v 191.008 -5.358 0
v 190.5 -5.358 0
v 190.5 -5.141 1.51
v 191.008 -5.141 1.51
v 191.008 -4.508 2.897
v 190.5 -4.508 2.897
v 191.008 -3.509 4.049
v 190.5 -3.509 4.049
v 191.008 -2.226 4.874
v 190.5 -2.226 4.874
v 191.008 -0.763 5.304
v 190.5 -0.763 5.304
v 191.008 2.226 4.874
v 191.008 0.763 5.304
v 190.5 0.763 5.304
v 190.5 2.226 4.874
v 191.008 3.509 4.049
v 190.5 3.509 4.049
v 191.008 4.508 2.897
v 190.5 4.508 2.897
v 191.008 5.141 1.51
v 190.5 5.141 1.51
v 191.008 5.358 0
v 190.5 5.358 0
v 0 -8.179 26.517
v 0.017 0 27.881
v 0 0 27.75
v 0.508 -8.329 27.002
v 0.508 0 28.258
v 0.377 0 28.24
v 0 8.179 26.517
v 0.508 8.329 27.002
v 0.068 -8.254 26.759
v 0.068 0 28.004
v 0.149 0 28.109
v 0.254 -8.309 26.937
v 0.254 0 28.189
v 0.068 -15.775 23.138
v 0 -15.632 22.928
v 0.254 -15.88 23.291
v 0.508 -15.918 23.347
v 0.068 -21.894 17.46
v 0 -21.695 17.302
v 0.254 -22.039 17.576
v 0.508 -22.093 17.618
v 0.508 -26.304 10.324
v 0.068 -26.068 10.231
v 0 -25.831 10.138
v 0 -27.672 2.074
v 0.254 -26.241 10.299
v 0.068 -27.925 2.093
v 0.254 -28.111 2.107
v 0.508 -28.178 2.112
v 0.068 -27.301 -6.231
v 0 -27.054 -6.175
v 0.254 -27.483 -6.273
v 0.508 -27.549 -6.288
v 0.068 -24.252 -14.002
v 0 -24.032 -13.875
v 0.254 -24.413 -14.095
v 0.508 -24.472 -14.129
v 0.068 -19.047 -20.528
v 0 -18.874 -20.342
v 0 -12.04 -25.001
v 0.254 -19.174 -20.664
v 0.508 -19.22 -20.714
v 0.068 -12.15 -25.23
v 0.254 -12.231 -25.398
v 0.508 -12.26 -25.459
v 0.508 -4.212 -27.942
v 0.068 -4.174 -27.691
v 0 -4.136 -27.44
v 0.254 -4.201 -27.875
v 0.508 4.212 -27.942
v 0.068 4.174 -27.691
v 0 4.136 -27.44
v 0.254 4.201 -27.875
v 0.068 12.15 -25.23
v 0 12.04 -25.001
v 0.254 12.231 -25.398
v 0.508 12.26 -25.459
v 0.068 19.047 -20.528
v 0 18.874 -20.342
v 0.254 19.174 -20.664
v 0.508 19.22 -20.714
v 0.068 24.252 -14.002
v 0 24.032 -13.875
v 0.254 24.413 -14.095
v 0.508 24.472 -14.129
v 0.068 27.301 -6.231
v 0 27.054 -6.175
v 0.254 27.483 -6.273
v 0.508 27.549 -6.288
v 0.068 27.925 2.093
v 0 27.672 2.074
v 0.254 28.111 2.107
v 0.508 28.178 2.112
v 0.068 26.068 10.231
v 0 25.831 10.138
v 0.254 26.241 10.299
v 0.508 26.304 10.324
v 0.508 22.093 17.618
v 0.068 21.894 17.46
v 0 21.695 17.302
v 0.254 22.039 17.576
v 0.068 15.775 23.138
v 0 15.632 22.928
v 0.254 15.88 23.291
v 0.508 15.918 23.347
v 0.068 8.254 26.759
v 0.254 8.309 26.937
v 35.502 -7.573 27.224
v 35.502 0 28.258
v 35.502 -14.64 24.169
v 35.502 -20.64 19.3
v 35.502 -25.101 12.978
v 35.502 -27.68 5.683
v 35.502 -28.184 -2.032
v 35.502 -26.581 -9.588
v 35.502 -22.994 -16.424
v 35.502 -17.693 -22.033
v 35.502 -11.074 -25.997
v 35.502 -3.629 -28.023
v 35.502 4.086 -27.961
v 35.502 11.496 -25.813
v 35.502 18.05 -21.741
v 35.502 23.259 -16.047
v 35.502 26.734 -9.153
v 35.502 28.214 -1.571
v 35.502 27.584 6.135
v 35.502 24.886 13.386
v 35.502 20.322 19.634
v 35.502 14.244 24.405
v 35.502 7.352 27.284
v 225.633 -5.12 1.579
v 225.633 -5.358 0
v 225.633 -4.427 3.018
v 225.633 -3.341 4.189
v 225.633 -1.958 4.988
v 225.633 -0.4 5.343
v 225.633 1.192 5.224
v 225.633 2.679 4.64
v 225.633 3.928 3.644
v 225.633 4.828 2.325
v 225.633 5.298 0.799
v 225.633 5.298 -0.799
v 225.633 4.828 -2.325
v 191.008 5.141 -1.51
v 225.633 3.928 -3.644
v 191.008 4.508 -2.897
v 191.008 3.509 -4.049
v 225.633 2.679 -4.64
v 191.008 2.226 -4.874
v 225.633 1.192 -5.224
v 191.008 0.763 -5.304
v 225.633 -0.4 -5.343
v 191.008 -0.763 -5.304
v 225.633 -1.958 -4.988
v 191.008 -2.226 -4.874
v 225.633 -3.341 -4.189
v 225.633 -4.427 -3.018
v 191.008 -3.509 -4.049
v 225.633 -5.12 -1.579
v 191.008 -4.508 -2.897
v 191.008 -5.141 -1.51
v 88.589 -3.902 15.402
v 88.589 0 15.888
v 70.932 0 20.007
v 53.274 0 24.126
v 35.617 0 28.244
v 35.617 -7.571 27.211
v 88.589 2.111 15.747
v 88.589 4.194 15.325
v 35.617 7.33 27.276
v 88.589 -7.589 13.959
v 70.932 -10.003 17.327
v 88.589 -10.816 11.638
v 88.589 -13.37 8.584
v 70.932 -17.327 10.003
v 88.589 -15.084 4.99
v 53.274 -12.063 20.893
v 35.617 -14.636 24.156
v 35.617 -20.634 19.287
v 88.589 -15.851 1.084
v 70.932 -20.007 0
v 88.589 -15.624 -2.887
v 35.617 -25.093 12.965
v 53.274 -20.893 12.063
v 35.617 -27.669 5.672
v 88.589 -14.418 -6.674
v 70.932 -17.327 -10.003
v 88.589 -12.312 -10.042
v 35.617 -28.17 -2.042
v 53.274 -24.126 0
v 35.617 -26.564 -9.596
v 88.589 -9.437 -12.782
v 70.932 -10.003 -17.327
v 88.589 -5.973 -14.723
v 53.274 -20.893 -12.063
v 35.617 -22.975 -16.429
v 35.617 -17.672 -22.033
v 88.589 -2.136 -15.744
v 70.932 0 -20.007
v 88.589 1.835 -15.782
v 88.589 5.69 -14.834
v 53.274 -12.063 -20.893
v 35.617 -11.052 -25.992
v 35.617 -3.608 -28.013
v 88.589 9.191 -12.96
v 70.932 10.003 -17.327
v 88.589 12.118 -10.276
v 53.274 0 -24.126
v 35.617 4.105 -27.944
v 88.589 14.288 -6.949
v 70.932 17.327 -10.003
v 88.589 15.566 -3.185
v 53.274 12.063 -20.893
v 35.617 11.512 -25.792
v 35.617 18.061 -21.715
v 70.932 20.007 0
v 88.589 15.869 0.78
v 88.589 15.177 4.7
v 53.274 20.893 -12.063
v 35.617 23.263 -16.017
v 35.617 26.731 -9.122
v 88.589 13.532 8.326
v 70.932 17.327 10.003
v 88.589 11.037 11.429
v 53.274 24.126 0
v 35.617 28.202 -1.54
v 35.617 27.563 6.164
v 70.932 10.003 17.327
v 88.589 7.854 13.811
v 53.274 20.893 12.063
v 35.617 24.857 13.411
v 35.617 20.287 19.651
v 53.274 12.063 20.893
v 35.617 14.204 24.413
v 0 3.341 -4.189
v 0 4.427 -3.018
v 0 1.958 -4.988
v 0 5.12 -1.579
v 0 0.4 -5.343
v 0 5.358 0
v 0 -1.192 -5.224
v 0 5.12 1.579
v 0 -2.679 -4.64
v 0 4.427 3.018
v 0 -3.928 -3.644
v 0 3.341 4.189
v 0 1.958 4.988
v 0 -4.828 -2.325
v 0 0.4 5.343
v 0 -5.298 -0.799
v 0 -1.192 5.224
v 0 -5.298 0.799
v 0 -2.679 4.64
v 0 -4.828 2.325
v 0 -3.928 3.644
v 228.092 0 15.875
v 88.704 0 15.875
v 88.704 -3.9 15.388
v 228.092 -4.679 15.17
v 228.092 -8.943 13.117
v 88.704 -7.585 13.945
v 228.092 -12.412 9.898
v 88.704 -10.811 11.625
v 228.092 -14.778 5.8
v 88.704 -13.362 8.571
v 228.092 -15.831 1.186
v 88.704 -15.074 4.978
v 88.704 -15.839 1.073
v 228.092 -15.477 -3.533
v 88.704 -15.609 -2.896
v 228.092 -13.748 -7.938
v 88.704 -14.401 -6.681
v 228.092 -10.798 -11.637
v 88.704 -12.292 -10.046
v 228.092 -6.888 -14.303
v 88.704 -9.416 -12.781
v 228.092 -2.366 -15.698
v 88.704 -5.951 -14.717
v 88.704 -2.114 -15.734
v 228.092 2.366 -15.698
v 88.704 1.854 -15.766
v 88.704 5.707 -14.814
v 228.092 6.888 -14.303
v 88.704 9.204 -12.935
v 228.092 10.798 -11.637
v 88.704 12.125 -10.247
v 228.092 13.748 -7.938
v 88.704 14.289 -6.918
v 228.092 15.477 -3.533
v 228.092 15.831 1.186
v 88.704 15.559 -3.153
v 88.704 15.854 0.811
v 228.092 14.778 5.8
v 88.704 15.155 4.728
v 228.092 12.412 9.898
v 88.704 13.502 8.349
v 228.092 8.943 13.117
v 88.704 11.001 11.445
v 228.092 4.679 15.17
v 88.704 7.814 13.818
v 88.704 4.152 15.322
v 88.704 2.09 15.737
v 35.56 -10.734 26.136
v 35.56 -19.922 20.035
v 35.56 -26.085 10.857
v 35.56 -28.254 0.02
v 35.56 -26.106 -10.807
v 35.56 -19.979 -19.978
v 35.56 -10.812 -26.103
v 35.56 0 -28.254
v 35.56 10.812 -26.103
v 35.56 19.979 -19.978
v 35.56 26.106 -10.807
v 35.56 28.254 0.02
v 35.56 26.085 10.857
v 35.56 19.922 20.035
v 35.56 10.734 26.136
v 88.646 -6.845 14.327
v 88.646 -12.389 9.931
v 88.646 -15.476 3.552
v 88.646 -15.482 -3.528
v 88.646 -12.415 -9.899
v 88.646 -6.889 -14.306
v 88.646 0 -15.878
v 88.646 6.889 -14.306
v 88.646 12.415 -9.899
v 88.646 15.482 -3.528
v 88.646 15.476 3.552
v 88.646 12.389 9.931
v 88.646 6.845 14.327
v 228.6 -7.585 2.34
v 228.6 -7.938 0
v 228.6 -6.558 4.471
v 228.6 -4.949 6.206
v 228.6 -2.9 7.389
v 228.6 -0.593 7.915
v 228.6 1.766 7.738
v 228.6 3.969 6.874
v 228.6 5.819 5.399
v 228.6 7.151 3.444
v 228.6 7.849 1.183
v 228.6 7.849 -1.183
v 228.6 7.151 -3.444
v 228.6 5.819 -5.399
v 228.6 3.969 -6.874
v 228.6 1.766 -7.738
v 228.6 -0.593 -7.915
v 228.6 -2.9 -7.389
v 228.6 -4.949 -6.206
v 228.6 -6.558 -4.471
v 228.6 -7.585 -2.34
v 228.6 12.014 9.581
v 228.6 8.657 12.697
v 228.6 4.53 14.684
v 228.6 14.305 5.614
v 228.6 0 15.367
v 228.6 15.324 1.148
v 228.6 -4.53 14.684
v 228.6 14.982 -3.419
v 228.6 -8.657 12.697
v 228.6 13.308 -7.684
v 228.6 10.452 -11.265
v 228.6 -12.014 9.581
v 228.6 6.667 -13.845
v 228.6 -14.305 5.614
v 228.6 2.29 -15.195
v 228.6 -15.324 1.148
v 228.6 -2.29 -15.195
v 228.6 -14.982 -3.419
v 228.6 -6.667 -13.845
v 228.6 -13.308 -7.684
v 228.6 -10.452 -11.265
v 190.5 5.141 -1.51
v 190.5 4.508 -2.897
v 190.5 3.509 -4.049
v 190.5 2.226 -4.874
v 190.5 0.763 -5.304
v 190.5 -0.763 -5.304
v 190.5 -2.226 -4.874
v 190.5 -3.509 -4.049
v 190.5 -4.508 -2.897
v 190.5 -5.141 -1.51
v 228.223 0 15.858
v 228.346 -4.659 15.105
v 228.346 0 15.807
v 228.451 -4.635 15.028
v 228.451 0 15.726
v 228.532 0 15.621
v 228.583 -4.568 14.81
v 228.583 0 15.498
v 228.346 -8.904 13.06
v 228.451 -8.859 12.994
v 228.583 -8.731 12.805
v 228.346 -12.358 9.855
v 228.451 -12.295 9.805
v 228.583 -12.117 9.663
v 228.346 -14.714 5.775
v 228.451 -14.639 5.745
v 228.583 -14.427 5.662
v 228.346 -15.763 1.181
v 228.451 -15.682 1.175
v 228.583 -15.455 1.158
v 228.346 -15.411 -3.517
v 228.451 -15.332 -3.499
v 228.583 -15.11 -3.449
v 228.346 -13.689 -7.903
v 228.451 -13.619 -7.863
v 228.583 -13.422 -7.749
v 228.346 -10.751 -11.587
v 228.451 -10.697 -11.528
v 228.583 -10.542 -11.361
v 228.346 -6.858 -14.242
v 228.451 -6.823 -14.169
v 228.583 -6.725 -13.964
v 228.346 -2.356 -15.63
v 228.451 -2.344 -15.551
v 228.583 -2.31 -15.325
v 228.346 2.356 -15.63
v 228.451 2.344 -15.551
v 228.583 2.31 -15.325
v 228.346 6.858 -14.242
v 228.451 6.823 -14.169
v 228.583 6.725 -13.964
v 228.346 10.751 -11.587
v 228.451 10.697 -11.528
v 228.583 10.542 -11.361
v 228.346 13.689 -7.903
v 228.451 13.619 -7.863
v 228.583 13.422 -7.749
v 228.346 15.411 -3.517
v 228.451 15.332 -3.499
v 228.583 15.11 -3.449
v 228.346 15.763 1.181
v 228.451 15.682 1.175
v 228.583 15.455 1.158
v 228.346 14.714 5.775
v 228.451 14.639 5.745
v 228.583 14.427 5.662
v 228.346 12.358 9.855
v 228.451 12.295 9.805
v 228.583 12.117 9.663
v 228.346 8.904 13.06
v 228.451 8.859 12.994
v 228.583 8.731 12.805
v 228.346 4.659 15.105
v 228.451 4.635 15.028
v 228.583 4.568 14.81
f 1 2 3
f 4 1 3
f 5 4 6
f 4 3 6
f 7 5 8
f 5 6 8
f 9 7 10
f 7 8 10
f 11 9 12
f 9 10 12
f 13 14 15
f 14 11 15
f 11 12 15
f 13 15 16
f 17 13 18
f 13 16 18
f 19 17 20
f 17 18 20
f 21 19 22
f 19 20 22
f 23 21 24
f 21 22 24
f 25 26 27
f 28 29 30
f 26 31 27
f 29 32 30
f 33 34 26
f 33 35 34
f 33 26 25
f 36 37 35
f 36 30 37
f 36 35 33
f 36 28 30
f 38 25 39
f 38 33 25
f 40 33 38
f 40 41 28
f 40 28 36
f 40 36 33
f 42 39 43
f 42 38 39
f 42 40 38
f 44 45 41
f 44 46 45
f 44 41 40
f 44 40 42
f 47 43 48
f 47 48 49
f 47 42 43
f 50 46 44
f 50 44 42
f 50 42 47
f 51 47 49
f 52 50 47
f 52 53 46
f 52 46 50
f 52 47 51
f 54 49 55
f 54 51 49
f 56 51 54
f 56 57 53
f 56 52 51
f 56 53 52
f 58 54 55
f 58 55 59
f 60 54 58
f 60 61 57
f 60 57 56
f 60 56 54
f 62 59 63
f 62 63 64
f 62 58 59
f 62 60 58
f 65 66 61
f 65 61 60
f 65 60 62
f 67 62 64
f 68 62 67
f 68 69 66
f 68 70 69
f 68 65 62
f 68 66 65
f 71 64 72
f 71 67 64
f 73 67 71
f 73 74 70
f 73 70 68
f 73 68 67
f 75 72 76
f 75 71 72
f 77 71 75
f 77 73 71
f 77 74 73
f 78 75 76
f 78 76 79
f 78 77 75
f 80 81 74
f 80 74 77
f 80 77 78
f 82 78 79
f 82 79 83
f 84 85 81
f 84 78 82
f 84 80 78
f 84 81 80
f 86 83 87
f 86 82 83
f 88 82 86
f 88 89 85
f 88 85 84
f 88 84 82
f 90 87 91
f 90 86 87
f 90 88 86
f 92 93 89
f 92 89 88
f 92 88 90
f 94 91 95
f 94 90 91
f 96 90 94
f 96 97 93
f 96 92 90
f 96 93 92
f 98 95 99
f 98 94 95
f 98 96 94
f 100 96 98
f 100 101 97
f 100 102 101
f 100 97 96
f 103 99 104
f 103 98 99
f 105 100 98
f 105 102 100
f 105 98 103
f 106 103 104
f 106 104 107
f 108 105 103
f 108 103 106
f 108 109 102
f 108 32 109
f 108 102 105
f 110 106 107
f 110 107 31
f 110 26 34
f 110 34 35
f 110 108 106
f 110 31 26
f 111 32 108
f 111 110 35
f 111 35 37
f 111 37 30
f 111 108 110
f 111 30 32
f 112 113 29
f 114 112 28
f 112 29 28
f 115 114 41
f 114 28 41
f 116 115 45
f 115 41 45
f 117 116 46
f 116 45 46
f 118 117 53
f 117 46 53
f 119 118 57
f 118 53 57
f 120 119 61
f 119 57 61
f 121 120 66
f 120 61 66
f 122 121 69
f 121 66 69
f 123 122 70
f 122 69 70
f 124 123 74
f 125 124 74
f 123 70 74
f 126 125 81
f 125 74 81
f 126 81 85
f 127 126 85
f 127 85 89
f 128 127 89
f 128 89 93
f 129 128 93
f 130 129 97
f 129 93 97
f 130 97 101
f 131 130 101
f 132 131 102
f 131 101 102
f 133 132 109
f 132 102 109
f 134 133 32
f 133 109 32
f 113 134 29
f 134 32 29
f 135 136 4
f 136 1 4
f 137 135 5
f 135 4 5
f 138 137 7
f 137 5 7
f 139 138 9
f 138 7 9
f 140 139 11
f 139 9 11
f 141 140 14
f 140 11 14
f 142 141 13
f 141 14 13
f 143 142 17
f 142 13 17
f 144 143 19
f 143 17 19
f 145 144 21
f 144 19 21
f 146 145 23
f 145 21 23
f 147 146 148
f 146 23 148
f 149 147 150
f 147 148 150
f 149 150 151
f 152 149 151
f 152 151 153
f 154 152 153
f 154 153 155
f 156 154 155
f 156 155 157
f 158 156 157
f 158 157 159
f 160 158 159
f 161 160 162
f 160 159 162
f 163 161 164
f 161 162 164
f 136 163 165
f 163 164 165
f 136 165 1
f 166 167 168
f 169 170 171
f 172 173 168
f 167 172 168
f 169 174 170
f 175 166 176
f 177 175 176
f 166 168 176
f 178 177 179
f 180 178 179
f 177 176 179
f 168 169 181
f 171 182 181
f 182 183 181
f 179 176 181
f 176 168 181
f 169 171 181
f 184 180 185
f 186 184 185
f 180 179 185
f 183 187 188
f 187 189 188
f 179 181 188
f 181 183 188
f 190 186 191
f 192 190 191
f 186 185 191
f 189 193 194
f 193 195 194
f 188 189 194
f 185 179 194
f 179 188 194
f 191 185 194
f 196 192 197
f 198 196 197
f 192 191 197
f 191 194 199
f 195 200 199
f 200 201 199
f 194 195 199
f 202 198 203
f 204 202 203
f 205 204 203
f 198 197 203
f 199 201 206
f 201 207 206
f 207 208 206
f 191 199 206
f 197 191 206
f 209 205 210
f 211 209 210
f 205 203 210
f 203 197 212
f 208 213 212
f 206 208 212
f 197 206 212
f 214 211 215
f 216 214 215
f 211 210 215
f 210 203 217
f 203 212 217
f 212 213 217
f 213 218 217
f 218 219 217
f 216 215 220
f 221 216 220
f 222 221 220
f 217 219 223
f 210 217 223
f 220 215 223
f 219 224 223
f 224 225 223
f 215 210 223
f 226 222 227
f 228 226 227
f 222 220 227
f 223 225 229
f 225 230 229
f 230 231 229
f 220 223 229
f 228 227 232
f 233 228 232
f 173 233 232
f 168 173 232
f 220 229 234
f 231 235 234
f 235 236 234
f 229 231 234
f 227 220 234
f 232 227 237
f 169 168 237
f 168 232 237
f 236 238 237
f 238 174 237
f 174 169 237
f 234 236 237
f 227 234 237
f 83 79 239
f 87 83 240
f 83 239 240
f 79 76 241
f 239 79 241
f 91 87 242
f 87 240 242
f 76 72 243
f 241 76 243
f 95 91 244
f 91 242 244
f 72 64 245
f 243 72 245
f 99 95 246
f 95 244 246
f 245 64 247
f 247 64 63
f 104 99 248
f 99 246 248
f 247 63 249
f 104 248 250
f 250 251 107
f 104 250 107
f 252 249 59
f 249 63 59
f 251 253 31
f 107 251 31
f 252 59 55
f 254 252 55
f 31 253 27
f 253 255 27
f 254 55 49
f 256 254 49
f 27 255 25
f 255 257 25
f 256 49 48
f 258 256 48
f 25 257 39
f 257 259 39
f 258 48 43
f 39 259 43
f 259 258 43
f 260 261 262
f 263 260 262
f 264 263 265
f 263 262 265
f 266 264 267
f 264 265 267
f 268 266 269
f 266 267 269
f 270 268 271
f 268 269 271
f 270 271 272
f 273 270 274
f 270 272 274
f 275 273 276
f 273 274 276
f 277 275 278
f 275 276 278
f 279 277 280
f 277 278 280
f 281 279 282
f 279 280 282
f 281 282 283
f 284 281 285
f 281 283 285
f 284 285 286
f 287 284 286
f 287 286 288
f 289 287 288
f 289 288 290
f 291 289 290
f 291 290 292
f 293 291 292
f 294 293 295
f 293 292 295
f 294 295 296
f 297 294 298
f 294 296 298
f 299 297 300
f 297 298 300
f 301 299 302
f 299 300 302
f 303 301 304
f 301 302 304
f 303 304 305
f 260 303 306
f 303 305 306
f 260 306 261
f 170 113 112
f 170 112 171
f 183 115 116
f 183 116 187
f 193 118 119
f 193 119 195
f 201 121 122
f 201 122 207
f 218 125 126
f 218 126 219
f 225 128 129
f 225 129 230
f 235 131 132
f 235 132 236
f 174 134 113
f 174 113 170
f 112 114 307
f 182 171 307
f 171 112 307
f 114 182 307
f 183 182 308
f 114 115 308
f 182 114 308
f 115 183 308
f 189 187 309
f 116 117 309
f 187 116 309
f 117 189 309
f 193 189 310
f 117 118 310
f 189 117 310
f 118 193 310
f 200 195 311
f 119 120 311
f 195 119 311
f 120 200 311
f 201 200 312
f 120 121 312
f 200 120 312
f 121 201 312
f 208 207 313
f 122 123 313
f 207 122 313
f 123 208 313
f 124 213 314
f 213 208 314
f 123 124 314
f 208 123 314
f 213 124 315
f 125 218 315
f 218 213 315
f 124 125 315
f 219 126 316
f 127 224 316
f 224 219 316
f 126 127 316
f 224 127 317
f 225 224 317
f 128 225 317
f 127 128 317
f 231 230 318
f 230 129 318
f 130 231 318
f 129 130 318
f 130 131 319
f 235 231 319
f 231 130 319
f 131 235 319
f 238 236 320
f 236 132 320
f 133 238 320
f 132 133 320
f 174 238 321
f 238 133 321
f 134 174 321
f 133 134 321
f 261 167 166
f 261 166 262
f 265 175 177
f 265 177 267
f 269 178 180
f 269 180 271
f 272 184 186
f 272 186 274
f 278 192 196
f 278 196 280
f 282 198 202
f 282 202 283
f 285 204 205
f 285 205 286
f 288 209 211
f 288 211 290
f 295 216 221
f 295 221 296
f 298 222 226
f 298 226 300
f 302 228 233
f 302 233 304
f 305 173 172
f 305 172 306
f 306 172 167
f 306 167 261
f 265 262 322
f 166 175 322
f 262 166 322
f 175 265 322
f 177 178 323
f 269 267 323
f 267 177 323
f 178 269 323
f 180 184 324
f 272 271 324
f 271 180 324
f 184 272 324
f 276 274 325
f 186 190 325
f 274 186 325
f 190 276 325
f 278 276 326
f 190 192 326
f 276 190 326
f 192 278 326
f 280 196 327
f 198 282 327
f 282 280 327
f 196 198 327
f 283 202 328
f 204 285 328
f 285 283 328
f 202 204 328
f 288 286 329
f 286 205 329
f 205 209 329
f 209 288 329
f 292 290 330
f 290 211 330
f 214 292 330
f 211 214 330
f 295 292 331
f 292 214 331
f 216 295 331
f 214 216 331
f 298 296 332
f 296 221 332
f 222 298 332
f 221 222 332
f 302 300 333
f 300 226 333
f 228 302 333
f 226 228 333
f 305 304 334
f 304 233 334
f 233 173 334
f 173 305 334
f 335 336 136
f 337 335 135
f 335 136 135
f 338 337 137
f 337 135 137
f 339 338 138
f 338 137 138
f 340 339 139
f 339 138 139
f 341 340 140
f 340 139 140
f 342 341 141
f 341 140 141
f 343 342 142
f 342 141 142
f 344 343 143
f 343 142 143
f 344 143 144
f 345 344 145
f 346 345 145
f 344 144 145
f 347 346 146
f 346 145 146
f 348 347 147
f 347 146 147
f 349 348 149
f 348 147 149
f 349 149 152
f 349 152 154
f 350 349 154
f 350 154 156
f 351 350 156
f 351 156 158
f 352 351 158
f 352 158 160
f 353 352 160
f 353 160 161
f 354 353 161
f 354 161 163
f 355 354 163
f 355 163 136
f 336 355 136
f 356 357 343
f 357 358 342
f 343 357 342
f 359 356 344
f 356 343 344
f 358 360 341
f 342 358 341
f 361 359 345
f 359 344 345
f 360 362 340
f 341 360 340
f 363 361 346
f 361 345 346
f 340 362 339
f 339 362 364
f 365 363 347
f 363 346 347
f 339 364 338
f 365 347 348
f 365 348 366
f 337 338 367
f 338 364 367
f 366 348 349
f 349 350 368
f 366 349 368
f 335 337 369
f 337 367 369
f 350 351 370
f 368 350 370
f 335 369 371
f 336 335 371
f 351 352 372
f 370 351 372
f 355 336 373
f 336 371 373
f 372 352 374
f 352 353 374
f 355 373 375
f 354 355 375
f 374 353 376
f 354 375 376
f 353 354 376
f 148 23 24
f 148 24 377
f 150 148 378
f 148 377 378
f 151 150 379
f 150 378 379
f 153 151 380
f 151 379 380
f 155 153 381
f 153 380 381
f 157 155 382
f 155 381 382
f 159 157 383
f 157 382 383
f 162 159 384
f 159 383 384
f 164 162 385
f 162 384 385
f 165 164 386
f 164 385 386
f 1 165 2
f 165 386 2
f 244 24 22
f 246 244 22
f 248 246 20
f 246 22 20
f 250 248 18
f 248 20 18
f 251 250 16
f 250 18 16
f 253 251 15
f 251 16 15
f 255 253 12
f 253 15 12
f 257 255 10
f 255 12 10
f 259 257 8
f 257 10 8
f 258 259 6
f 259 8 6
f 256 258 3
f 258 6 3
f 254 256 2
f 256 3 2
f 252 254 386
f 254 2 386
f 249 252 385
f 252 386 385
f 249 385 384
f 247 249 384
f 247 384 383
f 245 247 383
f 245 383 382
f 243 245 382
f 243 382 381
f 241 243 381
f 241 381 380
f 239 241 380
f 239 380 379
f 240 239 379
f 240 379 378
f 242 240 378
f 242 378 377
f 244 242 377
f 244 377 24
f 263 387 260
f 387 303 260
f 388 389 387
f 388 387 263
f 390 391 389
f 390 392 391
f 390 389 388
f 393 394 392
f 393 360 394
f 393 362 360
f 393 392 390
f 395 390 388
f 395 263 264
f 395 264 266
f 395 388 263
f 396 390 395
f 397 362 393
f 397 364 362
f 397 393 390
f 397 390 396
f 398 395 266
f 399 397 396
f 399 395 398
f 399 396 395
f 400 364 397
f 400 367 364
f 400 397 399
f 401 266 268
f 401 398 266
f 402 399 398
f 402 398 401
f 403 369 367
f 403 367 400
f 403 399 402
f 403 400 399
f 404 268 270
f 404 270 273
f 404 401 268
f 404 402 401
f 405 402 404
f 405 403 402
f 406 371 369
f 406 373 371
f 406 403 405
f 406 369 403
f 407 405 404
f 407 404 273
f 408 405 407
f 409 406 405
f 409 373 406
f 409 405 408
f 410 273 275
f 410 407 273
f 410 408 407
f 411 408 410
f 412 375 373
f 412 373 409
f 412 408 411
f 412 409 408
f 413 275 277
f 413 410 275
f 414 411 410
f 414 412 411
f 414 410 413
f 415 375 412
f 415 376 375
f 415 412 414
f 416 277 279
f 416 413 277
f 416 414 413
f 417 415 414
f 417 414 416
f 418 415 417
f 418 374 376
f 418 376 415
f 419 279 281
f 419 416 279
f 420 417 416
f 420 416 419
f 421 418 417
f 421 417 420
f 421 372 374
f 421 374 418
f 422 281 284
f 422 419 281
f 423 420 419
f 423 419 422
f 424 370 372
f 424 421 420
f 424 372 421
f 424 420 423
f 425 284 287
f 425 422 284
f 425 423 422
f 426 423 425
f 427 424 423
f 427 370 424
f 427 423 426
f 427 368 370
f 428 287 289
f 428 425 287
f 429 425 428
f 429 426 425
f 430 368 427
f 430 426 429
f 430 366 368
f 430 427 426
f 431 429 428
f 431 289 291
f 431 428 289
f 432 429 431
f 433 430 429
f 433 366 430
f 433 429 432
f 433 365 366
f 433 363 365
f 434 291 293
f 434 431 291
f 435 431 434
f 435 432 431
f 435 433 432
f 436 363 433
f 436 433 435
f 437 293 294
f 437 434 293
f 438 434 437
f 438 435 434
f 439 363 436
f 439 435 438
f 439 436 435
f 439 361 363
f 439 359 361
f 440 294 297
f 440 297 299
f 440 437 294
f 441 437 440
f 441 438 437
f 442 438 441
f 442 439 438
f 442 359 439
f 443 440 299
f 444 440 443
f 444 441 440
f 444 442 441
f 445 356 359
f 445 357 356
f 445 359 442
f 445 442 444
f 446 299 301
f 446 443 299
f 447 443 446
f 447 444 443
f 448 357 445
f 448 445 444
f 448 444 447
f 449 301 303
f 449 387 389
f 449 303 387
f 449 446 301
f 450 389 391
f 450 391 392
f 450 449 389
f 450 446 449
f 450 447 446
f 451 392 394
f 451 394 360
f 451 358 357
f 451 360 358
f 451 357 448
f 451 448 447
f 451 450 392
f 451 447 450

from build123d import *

# Parameters (mm, degrees)
F3_D           = 10.71626
F3_DEPTH       = 38.1
F3_CSINK_D     = 15.875
F3_CSINK_ANGLE = 82
F3_TIP         = 3.2194893086
F5_D           = 10.71626
F5_DEPTH       = 191.008
F5_TIP         = 3.2194893086
F6_R           = 0.508


with BuildPart() as f1:
    # F0 (on Front) → F1 (revolve)
    with BuildSketch(Plane.XZ):
        Polygon((0, 28.2575), (0, 0), (228.6, 0), (228.6, 15.875), (88.646, 15.875), (35.56, 28.2575), align=None)
    revolve(axis=Axis((114.3, 0, 0), (1, 0, 0)))

    # F3
    with Locations(Plane.YZ.offset(228.6)):
        with Locations((0, 0)):
            CounterSinkHole(F3_D / 2, F3_CSINK_D / 2, depth=F3_DEPTH, counter_sink_angle=F3_CSINK_ANGLE)
            with Locations((0, 0, -(F3_DEPTH + F3_TIP / 2))):  # 118° drill point
                Cone(0, F3_D / 2, F3_TIP, mode=Mode.SUBTRACT)

    # F5
    with Locations(Plane(origin=(0, 0, 0), x_dir=(0, -1, 0), z_dir=(-1, 0, 0))):
        with Locations((0, 0)):
            Hole(F5_D / 2, depth=F5_DEPTH)
            with Locations((0, 0, -(F5_DEPTH + F5_TIP / 2))):  # 118° drill point
                Cone(0, F5_D / 2, F5_TIP, mode=Mode.SUBTRACT)

    # F6
    f6_edges = [f1.edges().sort_by_distance(p)[0] for p in [
        (0, 0, -28.2575),
        (35.56, 0, -28.2575),
        (88.646, 0, -15.875),
        (228.6, 0, -15.875),
    ]]
    fillet(f6_edges, radius=F6_R)


solid = f1.part
